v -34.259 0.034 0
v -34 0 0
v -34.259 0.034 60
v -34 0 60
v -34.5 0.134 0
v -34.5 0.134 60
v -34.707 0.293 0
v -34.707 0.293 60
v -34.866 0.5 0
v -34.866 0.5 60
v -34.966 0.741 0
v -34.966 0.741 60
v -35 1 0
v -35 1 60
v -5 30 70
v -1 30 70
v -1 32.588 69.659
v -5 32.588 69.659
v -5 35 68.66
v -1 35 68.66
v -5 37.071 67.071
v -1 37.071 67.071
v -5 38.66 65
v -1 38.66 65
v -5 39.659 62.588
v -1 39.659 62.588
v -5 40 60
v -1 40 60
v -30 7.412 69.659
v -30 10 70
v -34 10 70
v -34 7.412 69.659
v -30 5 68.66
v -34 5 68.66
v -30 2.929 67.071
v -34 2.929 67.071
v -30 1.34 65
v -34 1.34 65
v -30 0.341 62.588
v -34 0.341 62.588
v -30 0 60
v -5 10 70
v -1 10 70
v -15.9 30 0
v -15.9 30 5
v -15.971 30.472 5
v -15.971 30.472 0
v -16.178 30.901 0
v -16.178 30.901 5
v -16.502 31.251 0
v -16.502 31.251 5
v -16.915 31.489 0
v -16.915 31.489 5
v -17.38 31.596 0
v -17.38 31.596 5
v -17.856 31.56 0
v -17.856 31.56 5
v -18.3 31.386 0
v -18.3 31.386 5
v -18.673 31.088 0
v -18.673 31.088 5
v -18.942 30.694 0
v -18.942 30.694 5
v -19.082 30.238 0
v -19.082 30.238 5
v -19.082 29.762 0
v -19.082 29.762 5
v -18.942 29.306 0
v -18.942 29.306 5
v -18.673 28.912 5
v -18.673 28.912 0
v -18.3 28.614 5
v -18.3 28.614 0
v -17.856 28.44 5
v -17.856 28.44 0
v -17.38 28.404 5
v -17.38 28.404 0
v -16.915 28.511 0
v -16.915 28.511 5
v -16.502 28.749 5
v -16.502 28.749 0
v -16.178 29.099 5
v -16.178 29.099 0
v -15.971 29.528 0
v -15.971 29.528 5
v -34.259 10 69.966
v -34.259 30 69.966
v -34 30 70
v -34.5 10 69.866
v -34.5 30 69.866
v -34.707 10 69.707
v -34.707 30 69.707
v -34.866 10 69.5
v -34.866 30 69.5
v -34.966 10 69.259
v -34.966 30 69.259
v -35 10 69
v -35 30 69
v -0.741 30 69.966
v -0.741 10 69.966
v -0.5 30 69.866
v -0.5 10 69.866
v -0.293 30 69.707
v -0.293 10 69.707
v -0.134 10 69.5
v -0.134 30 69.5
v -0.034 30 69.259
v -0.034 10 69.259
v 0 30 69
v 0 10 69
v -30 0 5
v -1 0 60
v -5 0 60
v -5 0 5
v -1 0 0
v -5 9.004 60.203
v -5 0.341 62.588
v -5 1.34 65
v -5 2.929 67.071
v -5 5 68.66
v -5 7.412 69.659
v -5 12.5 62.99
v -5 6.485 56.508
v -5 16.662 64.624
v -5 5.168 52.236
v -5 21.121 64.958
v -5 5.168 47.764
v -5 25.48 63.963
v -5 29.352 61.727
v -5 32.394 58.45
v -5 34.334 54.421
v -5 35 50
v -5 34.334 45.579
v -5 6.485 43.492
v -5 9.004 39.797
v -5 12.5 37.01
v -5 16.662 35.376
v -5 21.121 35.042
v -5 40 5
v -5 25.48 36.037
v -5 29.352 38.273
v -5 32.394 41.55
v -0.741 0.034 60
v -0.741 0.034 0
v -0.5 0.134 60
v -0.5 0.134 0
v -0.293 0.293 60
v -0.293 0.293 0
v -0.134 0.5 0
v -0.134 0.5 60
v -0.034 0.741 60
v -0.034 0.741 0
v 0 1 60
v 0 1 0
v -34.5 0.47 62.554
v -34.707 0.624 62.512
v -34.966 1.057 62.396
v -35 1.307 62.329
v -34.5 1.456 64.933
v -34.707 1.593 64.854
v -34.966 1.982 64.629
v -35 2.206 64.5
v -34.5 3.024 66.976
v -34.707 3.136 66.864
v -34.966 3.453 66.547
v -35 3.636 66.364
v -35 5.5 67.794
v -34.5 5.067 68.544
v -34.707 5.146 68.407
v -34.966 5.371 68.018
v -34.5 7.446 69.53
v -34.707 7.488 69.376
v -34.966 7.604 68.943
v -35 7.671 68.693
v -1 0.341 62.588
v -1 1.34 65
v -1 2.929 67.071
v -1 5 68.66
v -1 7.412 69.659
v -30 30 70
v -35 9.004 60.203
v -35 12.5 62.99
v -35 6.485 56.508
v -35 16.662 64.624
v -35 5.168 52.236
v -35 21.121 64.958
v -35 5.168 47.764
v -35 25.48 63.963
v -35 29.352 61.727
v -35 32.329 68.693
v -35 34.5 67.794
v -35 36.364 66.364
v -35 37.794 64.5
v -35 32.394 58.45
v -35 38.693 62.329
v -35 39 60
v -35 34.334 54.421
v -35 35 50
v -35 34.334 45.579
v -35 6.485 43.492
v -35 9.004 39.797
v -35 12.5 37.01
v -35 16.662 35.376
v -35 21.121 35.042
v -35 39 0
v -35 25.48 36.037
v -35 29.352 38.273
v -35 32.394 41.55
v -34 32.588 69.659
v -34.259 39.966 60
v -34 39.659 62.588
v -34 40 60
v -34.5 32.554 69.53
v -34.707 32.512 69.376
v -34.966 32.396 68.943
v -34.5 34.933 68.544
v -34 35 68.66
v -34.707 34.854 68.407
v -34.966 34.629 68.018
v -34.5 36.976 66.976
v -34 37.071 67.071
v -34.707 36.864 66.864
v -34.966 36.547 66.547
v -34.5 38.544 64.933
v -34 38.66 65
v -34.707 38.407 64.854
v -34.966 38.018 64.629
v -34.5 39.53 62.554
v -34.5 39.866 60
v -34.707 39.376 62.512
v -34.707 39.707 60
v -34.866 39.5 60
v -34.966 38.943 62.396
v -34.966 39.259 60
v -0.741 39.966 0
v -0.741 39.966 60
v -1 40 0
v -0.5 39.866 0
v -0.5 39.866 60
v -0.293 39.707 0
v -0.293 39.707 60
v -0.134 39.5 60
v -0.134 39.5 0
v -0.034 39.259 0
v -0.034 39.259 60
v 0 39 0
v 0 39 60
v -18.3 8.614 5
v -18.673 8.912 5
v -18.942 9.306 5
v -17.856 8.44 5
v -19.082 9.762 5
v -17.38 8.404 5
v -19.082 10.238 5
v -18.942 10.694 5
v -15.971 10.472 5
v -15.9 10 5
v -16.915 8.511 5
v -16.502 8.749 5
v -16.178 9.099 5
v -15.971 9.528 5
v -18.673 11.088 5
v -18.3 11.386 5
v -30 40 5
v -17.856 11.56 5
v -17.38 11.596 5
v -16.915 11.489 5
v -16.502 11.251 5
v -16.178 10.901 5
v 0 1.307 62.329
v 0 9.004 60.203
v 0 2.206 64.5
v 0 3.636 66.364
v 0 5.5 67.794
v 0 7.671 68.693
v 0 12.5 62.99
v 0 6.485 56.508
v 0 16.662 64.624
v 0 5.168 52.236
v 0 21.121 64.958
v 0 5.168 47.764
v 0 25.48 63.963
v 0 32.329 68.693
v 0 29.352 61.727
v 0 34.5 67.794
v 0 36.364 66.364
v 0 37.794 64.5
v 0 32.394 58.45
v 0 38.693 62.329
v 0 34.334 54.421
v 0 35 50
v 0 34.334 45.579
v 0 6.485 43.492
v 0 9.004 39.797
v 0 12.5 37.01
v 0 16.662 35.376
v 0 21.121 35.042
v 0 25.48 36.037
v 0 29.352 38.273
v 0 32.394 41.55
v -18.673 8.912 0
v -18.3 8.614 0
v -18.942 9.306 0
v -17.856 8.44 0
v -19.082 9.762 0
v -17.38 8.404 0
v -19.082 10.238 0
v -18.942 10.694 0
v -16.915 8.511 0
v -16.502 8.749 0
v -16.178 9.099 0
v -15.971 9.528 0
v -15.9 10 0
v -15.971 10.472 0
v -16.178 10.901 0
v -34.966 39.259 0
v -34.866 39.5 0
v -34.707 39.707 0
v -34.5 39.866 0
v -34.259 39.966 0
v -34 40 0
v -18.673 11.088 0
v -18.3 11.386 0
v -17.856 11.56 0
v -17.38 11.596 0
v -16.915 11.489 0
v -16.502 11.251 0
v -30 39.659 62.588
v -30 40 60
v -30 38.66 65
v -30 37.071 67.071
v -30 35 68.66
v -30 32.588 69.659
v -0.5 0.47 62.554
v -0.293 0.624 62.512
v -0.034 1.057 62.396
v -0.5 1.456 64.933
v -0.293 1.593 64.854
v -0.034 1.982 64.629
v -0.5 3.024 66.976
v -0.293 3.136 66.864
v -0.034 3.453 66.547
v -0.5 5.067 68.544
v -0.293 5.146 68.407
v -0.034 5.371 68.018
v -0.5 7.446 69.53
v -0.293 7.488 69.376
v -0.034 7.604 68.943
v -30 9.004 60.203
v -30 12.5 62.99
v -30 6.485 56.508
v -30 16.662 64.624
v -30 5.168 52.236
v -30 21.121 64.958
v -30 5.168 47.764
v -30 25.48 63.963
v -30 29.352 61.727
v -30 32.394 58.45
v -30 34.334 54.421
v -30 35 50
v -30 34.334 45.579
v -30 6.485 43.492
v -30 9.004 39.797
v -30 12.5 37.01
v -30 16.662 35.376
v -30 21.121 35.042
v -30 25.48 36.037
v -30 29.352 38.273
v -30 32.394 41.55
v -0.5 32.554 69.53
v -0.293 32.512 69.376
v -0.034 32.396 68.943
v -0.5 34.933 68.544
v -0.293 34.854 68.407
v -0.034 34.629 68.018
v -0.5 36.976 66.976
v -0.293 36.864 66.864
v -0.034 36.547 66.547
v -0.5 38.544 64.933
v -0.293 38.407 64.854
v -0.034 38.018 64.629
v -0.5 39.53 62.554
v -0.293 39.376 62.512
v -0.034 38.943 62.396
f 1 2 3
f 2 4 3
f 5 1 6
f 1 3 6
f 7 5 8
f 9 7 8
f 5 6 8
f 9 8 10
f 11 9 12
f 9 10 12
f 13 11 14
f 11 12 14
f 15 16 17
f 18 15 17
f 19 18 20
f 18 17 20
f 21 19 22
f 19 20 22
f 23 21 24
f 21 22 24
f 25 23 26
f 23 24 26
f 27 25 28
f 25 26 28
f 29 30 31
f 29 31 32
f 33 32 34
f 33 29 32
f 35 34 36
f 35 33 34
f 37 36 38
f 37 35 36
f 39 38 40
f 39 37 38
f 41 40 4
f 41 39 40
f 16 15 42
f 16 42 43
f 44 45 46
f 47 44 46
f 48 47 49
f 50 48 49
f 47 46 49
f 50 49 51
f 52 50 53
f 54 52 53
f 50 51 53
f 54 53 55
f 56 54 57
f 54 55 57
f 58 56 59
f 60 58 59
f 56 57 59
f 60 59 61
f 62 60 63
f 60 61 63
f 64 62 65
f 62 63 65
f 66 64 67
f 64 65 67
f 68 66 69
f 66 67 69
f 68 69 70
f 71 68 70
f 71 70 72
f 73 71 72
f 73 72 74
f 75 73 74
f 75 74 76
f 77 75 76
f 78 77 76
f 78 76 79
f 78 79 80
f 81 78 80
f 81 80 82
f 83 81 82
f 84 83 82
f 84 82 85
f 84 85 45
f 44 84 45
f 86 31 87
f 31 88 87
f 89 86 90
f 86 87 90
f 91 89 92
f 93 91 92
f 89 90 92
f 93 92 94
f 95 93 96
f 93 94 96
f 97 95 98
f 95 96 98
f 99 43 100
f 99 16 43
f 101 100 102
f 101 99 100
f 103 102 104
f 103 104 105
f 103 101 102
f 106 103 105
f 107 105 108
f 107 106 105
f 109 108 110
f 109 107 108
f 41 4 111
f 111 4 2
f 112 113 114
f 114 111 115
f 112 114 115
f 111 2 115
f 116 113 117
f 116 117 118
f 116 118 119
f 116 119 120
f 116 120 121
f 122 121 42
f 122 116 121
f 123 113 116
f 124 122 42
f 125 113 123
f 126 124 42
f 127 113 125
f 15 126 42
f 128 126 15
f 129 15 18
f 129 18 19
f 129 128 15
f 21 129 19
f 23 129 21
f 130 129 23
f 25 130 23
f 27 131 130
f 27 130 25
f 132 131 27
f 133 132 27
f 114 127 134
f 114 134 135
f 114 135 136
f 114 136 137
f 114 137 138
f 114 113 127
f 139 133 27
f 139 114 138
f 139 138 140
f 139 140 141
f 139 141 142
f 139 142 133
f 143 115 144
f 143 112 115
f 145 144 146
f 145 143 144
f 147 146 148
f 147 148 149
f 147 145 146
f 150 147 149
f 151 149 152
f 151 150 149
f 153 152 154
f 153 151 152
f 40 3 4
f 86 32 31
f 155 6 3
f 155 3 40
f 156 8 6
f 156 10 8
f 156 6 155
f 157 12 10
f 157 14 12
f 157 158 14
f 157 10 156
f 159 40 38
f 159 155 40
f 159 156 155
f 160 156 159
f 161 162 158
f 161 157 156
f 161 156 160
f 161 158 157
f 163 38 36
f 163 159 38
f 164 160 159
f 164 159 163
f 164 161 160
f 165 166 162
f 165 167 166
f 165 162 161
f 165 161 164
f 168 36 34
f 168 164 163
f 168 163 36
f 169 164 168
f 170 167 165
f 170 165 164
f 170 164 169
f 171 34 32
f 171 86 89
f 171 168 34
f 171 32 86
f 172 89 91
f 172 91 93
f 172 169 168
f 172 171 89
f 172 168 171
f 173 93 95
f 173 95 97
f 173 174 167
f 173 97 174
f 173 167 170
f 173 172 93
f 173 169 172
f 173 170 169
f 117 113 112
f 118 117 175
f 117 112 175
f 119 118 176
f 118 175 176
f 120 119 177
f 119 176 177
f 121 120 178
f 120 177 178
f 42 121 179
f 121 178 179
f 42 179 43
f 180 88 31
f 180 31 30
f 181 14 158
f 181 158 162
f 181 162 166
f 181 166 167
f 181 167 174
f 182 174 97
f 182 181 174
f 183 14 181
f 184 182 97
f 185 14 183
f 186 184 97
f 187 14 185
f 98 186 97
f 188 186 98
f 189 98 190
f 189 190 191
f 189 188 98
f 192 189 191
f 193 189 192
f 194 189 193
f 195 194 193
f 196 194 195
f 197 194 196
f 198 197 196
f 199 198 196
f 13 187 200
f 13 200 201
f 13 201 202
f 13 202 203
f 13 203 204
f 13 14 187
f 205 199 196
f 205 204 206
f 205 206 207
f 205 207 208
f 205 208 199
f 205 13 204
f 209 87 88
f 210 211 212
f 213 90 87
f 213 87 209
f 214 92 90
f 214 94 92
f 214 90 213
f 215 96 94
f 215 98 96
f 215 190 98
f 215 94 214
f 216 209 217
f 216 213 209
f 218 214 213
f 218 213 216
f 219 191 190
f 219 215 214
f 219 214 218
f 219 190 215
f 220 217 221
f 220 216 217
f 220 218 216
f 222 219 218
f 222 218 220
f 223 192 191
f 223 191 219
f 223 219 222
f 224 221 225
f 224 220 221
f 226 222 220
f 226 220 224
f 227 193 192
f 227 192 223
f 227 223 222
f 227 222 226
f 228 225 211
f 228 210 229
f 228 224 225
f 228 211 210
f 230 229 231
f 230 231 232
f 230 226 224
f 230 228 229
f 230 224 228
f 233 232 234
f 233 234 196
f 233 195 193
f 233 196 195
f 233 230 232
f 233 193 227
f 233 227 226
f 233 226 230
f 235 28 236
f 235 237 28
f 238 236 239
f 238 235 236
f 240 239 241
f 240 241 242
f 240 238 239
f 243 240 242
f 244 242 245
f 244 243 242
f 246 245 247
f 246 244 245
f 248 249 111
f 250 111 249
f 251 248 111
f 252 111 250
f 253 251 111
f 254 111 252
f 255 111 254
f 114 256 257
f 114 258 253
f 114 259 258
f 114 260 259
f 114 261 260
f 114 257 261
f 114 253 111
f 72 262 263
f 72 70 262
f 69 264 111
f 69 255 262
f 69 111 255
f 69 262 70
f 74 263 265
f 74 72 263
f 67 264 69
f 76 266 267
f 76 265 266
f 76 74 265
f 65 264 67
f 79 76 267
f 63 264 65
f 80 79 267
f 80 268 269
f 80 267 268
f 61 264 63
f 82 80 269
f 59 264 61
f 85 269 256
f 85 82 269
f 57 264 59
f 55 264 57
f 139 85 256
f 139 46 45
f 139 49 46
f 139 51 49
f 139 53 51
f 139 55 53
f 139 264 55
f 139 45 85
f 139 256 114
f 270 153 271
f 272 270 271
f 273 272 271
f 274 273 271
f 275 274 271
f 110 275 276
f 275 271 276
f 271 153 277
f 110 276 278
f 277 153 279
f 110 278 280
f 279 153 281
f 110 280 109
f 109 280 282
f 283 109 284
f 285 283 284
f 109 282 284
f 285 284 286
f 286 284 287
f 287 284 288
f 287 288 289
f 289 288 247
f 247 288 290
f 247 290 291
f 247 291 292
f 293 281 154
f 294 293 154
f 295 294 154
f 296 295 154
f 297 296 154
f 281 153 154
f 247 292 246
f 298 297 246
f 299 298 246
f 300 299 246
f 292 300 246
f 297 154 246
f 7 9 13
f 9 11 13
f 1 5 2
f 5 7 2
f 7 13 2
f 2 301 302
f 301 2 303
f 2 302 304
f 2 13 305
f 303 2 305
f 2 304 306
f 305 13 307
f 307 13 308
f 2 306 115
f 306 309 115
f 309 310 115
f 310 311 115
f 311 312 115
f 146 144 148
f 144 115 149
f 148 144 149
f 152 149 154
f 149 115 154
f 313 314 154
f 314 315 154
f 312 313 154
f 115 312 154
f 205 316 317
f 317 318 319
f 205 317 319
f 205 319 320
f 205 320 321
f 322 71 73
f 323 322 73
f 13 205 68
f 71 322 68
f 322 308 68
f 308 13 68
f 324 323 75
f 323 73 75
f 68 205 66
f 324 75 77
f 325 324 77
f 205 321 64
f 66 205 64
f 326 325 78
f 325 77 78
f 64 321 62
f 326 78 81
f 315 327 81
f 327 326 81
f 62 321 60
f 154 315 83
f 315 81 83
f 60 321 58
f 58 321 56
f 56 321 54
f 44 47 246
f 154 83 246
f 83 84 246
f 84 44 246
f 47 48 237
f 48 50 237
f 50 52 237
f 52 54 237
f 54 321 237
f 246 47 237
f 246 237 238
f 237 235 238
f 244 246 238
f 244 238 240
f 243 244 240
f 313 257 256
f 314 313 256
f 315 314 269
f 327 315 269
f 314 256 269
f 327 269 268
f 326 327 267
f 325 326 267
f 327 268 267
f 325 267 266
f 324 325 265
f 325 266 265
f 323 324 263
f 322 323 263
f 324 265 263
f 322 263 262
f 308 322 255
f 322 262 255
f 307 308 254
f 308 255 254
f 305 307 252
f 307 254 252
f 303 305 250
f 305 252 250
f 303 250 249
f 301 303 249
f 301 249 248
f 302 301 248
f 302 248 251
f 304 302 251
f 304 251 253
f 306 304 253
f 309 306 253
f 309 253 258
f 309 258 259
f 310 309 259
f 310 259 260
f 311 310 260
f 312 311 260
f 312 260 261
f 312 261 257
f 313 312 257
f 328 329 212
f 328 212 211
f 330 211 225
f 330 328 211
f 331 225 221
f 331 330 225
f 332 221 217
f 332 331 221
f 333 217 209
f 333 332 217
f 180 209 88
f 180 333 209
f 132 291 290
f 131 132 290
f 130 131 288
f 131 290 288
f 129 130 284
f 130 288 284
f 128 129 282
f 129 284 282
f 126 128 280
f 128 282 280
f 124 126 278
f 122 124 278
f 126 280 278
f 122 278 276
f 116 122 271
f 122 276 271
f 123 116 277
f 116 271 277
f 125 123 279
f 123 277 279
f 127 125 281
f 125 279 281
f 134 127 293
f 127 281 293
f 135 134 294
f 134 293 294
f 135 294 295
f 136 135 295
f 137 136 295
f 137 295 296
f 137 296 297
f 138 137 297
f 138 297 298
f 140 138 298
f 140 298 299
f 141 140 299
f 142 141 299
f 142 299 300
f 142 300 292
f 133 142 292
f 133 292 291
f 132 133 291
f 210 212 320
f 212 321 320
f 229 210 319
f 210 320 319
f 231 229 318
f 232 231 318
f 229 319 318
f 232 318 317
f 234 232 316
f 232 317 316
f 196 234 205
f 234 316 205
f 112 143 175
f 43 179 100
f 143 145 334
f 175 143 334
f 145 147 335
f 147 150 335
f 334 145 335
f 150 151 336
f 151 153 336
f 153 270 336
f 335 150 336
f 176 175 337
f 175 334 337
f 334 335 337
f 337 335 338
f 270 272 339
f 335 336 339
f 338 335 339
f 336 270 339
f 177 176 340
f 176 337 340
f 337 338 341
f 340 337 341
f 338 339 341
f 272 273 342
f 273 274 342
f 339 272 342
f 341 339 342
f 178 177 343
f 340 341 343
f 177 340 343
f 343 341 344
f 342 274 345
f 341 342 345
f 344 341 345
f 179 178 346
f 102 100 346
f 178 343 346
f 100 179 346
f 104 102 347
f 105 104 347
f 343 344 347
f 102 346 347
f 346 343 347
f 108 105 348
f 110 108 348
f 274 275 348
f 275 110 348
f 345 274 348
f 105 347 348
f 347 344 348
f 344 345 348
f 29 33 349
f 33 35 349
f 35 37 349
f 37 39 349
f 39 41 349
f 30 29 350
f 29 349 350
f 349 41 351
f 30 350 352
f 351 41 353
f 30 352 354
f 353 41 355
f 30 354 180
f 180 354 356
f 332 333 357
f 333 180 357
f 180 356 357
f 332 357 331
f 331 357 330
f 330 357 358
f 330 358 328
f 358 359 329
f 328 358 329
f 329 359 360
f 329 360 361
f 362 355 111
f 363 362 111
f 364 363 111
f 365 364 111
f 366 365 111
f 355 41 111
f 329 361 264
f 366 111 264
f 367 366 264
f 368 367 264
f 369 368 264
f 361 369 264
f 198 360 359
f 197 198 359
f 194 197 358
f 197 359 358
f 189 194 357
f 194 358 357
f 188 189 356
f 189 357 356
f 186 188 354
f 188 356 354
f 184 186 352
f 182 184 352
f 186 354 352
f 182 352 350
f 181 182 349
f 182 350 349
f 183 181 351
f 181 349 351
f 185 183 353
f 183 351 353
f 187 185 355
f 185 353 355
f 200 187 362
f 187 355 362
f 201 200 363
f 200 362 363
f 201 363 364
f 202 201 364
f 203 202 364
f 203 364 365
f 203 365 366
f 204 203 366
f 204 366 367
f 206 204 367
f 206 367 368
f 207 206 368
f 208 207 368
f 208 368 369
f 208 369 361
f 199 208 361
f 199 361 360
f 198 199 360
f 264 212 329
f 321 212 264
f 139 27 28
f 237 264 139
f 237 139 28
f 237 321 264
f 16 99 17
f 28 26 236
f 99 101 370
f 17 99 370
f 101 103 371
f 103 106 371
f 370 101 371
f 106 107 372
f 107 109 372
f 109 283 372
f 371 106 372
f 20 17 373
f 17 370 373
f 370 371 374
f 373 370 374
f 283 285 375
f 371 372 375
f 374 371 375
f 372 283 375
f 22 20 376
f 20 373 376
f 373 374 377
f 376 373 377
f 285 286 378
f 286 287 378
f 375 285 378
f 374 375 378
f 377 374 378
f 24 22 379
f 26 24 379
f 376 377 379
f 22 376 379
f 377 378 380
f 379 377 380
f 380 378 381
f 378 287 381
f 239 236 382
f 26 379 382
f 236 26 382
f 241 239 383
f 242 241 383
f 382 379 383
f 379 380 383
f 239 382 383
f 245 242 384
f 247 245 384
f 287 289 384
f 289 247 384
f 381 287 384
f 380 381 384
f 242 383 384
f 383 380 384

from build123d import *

# Parameters (mm, degrees)
SKETCH_W        = 35
SKETCH_H        = 40
PAD_DEPTH       = 5
SKETCH001_W     = 5
SKETCH001_H     = 40
PAD001_DEPTH    = 65
SKETCH002_R     = 15
POCKET_DEPTH    = 35.001
FILLET_R        = 10
FILLET001_R     = 10
FILLET002_R     = 10
SKETCH003_R     = 1.6
POCKET001_DEPTH = 5.001
FILLET003_R     = 1
FILLET004_R     = 1


with BuildPart() as part:
    # Sketch → Pad (new body)
    with BuildSketch(Plane.XY):
        with Locations((-17.5, 20)):
            Rectangle(SKETCH_W, SKETCH_H)
    extrude(amount=PAD_DEPTH)

    # Sketch001 (on Face6 of Pad) → Pad001 (join)
    with BuildSketch(Plane.XY.offset(5)):
        with Locations((-32.5, 20)):
            Rectangle(SKETCH001_W, SKETCH001_H)
        with Locations((-2.5, 20)):
            Rectangle(SKETCH001_W, SKETCH001_H)
    extrude(amount=PAD001_DEPTH)

    # Sketch002 (on Face9 of Pad001) → Pocket (cut, through all)
    with BuildSketch(Plane.YZ):
        with Locations((20, 50)):
            Circle(SKETCH002_R)
    extrude(amount=-POCKET_DEPTH, mode=Mode.SUBTRACT)

    # Fillet
    fillet_edges = [part.edges().sort_by_distance(p)[0] for p in [
        (-32.5, 0, 70),
    ]]
    fillet(fillet_edges, radius=FILLET_R)

    # Fillet001
    fillet001_edges = [part.edges().sort_by_distance(p)[0] for p in [
        (-2.5, 0, 70),
    ]]
    fillet(fillet001_edges, radius=FILLET001_R)

    # Fillet002
    fillet002_edges = [part.edges().sort_by_distance(p)[0] for p in [
        (-32.5, 40, 70),
        (-2.5, 40, 70),
    ]]
    fillet(fillet002_edges, radius=FILLET002_R)

    # Sketch003 (on Face7 of Fillet002) → Pocket001 (cut, through all)
    with BuildSketch(Plane.XY.offset(5)):
        with Locations((-17.5, 30)):
            Circle(SKETCH003_R)
        with Locations((-17.5, 10)):
            Circle(SKETCH003_R)
    extrude(amount=-POCKET001_DEPTH, mode=Mode.SUBTRACT)

    # Fillet003
    fillet003_edges = [part.edges().sort_by_distance(p)[0] for p in [
        (0, 0, 2.5),
        (0, 0, 32.5),
        (0, 2.928932, 67.071068),
        (0, 20, 70),
        (0, 37.071068, 67.071068),
        (0, 40, 32.5),
        (0, 40, 2.5),
    ]]
    fillet(fillet003_edges, radius=FILLET003_R)

    # Fillet004
    fillet004_edges = [part.edges().sort_by_distance(p)[0] for p in [
        (-35, 0, 32.5),
        (-35, 0, 2.5),
        (-35, 2.928932, 67.071068),
        (-35, 20, 70),
        (-35, 37.071068, 67.071068),
        (-35, 40, 32.5),
        (-35, 40, 2.5),
    ]]
    fillet(fillet004_edges, radius=FILLET004_R)


solid = part.part
